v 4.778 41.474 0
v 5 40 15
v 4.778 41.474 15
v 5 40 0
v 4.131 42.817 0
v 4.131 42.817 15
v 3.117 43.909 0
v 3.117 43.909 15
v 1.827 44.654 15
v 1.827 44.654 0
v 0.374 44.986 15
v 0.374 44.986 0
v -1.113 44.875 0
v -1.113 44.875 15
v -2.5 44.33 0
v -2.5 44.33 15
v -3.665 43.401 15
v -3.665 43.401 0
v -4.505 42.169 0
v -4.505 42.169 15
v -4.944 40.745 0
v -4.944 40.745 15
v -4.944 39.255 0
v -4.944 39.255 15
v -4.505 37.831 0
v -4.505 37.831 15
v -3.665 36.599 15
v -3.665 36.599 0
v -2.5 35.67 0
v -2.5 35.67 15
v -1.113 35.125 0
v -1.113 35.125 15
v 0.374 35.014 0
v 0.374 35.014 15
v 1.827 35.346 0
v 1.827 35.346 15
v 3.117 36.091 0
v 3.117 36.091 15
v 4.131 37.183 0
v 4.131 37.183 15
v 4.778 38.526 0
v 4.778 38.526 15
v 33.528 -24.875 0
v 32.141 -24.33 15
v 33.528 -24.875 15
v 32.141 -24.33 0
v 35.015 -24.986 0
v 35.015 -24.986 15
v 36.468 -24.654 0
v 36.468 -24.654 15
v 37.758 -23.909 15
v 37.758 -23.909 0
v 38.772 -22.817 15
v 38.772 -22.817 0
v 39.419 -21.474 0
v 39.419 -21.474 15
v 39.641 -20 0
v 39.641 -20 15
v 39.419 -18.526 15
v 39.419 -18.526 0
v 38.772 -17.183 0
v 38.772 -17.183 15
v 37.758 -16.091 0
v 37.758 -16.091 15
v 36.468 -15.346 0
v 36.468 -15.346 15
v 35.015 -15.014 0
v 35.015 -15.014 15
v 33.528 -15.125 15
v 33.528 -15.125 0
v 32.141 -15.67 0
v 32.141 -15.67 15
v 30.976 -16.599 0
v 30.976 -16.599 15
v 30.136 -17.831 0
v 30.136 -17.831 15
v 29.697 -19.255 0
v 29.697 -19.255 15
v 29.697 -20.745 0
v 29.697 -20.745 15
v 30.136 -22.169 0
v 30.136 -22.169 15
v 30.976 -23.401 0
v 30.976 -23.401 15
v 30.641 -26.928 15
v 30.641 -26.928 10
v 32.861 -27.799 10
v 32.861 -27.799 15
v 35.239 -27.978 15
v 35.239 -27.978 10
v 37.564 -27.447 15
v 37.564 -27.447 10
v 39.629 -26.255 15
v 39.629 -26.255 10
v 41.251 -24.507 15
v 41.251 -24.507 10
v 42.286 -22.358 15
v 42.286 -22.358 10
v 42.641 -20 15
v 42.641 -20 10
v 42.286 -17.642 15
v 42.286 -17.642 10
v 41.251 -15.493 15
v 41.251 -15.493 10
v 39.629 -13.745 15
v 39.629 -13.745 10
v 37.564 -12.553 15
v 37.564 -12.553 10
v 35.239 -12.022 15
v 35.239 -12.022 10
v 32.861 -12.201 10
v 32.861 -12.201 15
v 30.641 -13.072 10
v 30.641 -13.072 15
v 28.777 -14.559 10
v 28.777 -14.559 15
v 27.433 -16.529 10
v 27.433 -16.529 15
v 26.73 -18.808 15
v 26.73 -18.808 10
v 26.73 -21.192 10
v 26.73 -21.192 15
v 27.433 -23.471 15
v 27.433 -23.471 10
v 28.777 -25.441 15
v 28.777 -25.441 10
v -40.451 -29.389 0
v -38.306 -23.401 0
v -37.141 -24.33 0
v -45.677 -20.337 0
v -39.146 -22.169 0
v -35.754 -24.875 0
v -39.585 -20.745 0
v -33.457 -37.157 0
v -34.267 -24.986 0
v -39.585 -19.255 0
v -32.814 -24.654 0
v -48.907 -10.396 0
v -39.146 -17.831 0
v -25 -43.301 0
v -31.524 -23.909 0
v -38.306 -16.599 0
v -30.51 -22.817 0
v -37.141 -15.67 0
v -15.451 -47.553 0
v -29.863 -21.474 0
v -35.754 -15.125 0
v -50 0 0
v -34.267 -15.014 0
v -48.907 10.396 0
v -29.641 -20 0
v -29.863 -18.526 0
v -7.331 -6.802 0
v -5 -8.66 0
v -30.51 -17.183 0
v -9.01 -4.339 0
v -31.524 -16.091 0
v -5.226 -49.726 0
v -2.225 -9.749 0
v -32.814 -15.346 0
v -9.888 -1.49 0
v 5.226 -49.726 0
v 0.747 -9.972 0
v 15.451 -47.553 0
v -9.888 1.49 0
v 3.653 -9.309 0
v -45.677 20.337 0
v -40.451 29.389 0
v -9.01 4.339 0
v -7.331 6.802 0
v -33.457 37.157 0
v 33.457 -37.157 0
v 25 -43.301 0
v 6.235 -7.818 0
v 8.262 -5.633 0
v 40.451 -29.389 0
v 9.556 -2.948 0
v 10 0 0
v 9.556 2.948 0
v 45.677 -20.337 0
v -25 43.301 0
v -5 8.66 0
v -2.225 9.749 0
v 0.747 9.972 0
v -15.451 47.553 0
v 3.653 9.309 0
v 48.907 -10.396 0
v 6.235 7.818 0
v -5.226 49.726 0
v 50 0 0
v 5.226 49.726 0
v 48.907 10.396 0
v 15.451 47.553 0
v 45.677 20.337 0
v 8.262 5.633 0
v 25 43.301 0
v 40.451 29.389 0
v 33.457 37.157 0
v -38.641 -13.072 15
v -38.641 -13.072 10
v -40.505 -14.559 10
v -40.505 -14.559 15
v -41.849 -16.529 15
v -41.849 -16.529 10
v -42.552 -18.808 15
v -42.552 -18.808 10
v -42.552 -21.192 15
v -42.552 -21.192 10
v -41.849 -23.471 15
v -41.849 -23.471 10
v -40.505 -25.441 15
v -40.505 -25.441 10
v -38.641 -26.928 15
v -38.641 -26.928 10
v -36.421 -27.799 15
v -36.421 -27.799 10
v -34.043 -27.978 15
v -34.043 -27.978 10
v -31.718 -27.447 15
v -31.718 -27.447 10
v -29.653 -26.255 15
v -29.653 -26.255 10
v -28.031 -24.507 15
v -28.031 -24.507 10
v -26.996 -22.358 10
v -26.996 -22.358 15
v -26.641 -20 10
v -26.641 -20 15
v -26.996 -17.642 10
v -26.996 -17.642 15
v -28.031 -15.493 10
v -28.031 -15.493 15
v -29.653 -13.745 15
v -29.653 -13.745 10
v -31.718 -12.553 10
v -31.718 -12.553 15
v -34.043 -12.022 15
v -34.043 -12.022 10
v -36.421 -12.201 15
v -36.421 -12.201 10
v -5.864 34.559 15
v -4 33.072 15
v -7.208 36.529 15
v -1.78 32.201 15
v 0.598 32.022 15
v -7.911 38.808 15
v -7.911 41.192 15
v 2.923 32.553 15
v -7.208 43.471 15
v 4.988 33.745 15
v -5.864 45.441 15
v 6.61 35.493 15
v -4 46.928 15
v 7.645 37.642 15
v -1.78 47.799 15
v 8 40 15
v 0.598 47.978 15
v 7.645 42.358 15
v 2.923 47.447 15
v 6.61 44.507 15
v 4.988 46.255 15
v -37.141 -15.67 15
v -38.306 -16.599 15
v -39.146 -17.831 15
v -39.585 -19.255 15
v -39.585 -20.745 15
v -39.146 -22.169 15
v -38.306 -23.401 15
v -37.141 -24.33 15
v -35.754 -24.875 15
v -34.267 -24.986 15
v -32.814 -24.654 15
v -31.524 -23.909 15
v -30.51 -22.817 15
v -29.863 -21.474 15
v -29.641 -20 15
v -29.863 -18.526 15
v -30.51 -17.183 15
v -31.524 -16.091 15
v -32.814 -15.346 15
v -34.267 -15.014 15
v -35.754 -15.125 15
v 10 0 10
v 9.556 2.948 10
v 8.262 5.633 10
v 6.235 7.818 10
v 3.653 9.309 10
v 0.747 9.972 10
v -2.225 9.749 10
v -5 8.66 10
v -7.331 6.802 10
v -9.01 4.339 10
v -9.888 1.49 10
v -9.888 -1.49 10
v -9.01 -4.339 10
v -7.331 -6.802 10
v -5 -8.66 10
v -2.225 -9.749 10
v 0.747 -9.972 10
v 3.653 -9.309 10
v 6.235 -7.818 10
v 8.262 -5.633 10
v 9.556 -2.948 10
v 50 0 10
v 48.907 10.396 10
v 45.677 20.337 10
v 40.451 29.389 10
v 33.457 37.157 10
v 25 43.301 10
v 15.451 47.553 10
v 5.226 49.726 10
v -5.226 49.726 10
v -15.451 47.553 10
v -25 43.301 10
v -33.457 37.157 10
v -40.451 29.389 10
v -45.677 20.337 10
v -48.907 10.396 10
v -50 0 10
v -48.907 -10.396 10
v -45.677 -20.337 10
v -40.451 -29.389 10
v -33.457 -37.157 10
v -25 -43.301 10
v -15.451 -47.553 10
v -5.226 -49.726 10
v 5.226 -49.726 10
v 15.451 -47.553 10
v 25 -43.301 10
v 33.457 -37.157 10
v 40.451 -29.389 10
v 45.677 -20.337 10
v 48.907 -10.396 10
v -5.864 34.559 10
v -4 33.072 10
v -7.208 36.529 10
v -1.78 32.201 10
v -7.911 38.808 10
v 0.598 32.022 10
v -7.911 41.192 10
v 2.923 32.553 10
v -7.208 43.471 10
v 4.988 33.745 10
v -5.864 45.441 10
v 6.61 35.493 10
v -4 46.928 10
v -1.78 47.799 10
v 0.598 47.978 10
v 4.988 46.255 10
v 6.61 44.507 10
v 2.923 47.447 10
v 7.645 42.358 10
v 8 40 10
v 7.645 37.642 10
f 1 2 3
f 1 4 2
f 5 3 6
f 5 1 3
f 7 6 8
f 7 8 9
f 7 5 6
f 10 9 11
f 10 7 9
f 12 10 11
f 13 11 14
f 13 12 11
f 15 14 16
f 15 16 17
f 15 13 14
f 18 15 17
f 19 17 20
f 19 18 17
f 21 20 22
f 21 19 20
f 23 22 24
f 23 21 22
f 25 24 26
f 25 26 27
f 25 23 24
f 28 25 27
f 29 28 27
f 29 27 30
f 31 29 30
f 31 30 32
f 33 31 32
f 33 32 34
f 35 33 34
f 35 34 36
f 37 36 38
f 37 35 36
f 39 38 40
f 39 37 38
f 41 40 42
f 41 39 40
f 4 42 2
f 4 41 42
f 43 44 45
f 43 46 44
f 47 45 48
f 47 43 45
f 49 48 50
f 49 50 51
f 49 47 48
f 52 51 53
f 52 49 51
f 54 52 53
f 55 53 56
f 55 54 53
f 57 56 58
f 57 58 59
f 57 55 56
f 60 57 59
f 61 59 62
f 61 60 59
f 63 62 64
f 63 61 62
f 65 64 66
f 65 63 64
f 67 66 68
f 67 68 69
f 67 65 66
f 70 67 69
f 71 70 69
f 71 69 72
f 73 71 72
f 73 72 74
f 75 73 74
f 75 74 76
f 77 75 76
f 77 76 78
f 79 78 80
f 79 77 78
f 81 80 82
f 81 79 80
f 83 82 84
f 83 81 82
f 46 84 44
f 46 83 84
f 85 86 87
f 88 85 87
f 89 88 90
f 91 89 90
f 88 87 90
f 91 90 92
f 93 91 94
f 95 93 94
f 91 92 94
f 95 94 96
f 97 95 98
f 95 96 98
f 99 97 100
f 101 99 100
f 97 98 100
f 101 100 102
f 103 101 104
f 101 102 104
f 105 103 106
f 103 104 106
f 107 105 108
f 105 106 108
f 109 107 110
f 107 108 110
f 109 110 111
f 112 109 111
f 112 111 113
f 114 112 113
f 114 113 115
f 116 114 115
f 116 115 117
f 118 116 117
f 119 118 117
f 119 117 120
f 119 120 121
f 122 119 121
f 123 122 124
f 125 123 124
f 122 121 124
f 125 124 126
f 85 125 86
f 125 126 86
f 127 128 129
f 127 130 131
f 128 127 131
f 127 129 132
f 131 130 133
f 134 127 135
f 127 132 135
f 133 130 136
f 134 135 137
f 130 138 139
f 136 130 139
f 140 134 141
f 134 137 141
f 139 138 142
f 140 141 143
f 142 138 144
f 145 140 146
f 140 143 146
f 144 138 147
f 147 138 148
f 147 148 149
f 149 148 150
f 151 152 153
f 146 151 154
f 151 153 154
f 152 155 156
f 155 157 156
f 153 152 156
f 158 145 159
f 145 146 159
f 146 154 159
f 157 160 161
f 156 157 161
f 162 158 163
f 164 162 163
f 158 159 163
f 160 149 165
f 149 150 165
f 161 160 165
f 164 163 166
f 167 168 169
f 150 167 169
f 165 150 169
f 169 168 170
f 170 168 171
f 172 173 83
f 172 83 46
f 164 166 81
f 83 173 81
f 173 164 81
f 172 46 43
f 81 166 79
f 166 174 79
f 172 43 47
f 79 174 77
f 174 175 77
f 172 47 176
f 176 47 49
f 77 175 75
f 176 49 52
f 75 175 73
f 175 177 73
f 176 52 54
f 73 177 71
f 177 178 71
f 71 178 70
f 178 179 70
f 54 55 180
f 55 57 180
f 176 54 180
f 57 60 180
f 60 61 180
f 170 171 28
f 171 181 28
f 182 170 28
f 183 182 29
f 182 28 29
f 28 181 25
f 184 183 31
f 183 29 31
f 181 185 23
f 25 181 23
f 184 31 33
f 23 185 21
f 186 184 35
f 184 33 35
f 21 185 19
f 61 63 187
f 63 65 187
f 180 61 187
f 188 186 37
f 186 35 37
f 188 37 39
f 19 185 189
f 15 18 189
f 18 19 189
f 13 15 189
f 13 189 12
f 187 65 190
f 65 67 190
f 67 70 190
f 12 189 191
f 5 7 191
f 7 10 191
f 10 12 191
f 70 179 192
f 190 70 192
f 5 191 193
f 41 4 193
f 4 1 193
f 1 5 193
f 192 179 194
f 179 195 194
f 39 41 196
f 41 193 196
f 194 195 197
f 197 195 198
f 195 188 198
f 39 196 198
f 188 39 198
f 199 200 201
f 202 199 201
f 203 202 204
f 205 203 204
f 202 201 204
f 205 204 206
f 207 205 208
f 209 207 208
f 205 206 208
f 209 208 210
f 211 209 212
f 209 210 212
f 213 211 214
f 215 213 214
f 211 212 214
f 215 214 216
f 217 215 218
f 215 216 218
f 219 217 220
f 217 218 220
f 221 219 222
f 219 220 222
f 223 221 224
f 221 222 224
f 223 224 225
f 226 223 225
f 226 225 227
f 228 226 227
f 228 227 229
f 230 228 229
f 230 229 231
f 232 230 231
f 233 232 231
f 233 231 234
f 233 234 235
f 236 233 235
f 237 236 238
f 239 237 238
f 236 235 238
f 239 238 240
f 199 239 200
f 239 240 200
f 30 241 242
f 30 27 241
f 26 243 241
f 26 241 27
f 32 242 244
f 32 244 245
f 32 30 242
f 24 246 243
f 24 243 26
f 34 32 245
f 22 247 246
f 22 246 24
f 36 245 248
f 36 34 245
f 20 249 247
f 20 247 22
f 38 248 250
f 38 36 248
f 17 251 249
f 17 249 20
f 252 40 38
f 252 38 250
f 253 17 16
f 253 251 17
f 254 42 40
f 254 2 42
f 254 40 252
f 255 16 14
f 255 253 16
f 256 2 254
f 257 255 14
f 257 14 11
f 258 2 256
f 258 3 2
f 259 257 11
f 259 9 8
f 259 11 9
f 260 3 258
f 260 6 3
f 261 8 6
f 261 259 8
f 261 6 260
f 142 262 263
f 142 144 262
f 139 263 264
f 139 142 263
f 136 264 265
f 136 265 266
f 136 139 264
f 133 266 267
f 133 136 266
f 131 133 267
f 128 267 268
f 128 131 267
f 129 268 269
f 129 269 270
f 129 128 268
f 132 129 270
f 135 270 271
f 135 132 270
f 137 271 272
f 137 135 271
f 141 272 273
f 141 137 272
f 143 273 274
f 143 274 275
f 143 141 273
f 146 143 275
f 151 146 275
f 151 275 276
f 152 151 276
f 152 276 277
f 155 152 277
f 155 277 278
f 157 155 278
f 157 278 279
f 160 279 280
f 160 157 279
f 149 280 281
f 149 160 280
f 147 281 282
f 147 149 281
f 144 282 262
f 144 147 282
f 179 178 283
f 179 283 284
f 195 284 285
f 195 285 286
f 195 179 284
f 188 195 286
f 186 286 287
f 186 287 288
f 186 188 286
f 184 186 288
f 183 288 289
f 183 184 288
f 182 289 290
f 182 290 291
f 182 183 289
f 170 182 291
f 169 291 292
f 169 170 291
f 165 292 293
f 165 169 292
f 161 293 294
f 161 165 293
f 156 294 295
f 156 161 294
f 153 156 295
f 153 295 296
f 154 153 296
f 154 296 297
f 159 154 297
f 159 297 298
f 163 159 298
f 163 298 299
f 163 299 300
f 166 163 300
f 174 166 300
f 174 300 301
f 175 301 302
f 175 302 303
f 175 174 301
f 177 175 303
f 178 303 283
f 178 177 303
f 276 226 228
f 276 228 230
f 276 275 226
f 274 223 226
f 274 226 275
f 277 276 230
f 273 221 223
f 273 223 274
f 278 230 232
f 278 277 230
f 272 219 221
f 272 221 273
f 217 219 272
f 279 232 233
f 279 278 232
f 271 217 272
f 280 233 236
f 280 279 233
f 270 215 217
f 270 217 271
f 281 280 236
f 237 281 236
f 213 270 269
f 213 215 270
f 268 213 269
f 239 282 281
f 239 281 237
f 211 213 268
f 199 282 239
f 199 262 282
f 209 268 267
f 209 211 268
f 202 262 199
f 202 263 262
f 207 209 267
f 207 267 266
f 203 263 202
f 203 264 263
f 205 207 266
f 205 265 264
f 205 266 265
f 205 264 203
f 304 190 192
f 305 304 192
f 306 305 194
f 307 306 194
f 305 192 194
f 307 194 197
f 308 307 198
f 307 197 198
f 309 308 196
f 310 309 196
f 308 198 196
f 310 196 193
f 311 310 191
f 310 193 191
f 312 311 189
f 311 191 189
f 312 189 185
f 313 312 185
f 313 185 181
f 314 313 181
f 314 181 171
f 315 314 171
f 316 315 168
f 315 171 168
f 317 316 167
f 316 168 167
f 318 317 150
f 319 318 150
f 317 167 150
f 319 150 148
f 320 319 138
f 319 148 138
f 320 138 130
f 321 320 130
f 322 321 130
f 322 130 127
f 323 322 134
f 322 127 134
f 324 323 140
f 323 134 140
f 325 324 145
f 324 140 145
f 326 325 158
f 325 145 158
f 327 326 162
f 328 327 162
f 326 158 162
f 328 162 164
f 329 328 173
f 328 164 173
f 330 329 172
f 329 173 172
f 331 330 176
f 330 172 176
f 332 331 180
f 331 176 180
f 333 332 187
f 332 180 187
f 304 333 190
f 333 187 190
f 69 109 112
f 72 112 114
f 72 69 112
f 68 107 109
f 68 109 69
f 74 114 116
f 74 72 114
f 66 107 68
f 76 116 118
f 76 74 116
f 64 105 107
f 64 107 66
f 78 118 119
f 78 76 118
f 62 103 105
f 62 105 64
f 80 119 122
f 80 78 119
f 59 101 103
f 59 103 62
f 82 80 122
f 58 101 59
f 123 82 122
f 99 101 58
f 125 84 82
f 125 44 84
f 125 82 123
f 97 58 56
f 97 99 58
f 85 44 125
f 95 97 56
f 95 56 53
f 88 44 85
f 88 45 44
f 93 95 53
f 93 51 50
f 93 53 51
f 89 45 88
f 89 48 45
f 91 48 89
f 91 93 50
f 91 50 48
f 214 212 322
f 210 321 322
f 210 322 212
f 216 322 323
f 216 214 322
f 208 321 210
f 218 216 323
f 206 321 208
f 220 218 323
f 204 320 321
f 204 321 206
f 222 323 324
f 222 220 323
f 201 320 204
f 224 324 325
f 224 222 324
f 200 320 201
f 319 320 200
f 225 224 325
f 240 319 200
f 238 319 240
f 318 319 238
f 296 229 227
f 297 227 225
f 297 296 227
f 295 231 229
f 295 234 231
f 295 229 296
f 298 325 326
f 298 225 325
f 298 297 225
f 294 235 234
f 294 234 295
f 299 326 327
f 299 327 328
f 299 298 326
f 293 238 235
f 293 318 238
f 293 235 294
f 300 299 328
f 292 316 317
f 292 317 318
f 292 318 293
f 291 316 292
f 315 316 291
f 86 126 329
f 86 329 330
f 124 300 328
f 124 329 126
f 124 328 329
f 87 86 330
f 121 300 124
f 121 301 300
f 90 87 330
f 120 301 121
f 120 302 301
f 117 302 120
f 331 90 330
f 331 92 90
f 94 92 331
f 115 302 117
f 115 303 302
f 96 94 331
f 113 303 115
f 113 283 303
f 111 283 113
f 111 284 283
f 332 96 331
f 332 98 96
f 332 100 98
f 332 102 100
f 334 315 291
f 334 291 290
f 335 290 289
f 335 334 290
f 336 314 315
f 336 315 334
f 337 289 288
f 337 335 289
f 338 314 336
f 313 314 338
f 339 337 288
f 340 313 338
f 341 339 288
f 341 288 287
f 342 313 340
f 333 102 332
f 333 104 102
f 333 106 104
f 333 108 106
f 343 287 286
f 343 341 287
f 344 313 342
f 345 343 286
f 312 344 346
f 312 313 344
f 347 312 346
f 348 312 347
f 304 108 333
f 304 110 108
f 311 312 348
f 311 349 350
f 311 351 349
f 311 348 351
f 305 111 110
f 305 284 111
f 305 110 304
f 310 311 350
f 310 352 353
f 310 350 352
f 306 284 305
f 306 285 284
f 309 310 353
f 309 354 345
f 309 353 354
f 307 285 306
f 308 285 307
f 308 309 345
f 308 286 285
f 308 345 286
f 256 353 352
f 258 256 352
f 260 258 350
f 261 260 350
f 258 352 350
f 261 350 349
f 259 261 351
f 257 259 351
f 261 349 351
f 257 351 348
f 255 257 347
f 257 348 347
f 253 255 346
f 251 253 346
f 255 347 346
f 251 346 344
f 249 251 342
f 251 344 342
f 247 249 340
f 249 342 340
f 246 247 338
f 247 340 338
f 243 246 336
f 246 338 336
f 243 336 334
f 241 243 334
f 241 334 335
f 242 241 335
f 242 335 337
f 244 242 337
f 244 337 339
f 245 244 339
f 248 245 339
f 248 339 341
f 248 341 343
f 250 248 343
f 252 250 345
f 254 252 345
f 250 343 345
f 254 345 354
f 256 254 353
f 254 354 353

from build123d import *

# Parameters (mm, degrees)
SKETCH1_R           = 50
SKETCH1_R_2         = 10
BOSS_EXTRUDE2_DEPTH = 10
SKETCH3_R           = 5
CUT_EXTRUDE2_DEPTH  = 10
CIRPATTERN1_COUNT   = 3
SKETCH4_R           = 8
SKETCH4_R_2         = 5
BOSS_EXTRUDE3_DEPTH = 5
CIRPATTERN2_COUNT   = 3


with BuildPart() as part:
    # Sketch1 → Boss-Extrude2 (new body)
    with BuildSketch(Plane.XY):
        Circle(SKETCH1_R)
        Circle(SKETCH1_R_2, mode=Mode.SUBTRACT)
    extrude(amount=BOSS_EXTRUDE2_DEPTH)

    # Sketch3 → Cut-Extrude2 (cut)
    with BuildSketch(Plane.XY):
        with Locations((0, 40)):
            Circle(SKETCH3_R)
    cut_extrude2 = extrude(amount=CUT_EXTRUDE2_DEPTH, mode=Mode.SUBTRACT)

    # CirPattern1: Cut-Extrude2 ×3 about axis
    cirpattern1_axis = Axis((0, 0, 0), (0, 0, 1))
    for i in range(1, CIRPATTERN1_COUNT):
        add(cut_extrude2.rotate(cirpattern1_axis, i * 360 / CIRPATTERN1_COUNT), mode=Mode.SUBTRACT)

    # Sketch4 → Boss-Extrude3 (add)
    with BuildSketch(Plane.XY.offset(10)):
        with Locations((0, 40)):
            Circle(SKETCH4_R)
        with Locations((0, 40)):
            Circle(SKETCH4_R_2, mode=Mode.SUBTRACT)
    boss_extrude3 = extrude(amount=BOSS_EXTRUDE3_DEPTH)

    # CirPattern2: Boss-Extrude3 ×3 about axis
    cirpattern2_axis = Axis((0, 0, 0), (0, 0, 1))
    for i in range(1, CIRPATTERN2_COUNT):
        add(boss_extrude3.rotate(cirpattern2_axis, i * 360 / CIRPATTERN2_COUNT))


solid = part.part
